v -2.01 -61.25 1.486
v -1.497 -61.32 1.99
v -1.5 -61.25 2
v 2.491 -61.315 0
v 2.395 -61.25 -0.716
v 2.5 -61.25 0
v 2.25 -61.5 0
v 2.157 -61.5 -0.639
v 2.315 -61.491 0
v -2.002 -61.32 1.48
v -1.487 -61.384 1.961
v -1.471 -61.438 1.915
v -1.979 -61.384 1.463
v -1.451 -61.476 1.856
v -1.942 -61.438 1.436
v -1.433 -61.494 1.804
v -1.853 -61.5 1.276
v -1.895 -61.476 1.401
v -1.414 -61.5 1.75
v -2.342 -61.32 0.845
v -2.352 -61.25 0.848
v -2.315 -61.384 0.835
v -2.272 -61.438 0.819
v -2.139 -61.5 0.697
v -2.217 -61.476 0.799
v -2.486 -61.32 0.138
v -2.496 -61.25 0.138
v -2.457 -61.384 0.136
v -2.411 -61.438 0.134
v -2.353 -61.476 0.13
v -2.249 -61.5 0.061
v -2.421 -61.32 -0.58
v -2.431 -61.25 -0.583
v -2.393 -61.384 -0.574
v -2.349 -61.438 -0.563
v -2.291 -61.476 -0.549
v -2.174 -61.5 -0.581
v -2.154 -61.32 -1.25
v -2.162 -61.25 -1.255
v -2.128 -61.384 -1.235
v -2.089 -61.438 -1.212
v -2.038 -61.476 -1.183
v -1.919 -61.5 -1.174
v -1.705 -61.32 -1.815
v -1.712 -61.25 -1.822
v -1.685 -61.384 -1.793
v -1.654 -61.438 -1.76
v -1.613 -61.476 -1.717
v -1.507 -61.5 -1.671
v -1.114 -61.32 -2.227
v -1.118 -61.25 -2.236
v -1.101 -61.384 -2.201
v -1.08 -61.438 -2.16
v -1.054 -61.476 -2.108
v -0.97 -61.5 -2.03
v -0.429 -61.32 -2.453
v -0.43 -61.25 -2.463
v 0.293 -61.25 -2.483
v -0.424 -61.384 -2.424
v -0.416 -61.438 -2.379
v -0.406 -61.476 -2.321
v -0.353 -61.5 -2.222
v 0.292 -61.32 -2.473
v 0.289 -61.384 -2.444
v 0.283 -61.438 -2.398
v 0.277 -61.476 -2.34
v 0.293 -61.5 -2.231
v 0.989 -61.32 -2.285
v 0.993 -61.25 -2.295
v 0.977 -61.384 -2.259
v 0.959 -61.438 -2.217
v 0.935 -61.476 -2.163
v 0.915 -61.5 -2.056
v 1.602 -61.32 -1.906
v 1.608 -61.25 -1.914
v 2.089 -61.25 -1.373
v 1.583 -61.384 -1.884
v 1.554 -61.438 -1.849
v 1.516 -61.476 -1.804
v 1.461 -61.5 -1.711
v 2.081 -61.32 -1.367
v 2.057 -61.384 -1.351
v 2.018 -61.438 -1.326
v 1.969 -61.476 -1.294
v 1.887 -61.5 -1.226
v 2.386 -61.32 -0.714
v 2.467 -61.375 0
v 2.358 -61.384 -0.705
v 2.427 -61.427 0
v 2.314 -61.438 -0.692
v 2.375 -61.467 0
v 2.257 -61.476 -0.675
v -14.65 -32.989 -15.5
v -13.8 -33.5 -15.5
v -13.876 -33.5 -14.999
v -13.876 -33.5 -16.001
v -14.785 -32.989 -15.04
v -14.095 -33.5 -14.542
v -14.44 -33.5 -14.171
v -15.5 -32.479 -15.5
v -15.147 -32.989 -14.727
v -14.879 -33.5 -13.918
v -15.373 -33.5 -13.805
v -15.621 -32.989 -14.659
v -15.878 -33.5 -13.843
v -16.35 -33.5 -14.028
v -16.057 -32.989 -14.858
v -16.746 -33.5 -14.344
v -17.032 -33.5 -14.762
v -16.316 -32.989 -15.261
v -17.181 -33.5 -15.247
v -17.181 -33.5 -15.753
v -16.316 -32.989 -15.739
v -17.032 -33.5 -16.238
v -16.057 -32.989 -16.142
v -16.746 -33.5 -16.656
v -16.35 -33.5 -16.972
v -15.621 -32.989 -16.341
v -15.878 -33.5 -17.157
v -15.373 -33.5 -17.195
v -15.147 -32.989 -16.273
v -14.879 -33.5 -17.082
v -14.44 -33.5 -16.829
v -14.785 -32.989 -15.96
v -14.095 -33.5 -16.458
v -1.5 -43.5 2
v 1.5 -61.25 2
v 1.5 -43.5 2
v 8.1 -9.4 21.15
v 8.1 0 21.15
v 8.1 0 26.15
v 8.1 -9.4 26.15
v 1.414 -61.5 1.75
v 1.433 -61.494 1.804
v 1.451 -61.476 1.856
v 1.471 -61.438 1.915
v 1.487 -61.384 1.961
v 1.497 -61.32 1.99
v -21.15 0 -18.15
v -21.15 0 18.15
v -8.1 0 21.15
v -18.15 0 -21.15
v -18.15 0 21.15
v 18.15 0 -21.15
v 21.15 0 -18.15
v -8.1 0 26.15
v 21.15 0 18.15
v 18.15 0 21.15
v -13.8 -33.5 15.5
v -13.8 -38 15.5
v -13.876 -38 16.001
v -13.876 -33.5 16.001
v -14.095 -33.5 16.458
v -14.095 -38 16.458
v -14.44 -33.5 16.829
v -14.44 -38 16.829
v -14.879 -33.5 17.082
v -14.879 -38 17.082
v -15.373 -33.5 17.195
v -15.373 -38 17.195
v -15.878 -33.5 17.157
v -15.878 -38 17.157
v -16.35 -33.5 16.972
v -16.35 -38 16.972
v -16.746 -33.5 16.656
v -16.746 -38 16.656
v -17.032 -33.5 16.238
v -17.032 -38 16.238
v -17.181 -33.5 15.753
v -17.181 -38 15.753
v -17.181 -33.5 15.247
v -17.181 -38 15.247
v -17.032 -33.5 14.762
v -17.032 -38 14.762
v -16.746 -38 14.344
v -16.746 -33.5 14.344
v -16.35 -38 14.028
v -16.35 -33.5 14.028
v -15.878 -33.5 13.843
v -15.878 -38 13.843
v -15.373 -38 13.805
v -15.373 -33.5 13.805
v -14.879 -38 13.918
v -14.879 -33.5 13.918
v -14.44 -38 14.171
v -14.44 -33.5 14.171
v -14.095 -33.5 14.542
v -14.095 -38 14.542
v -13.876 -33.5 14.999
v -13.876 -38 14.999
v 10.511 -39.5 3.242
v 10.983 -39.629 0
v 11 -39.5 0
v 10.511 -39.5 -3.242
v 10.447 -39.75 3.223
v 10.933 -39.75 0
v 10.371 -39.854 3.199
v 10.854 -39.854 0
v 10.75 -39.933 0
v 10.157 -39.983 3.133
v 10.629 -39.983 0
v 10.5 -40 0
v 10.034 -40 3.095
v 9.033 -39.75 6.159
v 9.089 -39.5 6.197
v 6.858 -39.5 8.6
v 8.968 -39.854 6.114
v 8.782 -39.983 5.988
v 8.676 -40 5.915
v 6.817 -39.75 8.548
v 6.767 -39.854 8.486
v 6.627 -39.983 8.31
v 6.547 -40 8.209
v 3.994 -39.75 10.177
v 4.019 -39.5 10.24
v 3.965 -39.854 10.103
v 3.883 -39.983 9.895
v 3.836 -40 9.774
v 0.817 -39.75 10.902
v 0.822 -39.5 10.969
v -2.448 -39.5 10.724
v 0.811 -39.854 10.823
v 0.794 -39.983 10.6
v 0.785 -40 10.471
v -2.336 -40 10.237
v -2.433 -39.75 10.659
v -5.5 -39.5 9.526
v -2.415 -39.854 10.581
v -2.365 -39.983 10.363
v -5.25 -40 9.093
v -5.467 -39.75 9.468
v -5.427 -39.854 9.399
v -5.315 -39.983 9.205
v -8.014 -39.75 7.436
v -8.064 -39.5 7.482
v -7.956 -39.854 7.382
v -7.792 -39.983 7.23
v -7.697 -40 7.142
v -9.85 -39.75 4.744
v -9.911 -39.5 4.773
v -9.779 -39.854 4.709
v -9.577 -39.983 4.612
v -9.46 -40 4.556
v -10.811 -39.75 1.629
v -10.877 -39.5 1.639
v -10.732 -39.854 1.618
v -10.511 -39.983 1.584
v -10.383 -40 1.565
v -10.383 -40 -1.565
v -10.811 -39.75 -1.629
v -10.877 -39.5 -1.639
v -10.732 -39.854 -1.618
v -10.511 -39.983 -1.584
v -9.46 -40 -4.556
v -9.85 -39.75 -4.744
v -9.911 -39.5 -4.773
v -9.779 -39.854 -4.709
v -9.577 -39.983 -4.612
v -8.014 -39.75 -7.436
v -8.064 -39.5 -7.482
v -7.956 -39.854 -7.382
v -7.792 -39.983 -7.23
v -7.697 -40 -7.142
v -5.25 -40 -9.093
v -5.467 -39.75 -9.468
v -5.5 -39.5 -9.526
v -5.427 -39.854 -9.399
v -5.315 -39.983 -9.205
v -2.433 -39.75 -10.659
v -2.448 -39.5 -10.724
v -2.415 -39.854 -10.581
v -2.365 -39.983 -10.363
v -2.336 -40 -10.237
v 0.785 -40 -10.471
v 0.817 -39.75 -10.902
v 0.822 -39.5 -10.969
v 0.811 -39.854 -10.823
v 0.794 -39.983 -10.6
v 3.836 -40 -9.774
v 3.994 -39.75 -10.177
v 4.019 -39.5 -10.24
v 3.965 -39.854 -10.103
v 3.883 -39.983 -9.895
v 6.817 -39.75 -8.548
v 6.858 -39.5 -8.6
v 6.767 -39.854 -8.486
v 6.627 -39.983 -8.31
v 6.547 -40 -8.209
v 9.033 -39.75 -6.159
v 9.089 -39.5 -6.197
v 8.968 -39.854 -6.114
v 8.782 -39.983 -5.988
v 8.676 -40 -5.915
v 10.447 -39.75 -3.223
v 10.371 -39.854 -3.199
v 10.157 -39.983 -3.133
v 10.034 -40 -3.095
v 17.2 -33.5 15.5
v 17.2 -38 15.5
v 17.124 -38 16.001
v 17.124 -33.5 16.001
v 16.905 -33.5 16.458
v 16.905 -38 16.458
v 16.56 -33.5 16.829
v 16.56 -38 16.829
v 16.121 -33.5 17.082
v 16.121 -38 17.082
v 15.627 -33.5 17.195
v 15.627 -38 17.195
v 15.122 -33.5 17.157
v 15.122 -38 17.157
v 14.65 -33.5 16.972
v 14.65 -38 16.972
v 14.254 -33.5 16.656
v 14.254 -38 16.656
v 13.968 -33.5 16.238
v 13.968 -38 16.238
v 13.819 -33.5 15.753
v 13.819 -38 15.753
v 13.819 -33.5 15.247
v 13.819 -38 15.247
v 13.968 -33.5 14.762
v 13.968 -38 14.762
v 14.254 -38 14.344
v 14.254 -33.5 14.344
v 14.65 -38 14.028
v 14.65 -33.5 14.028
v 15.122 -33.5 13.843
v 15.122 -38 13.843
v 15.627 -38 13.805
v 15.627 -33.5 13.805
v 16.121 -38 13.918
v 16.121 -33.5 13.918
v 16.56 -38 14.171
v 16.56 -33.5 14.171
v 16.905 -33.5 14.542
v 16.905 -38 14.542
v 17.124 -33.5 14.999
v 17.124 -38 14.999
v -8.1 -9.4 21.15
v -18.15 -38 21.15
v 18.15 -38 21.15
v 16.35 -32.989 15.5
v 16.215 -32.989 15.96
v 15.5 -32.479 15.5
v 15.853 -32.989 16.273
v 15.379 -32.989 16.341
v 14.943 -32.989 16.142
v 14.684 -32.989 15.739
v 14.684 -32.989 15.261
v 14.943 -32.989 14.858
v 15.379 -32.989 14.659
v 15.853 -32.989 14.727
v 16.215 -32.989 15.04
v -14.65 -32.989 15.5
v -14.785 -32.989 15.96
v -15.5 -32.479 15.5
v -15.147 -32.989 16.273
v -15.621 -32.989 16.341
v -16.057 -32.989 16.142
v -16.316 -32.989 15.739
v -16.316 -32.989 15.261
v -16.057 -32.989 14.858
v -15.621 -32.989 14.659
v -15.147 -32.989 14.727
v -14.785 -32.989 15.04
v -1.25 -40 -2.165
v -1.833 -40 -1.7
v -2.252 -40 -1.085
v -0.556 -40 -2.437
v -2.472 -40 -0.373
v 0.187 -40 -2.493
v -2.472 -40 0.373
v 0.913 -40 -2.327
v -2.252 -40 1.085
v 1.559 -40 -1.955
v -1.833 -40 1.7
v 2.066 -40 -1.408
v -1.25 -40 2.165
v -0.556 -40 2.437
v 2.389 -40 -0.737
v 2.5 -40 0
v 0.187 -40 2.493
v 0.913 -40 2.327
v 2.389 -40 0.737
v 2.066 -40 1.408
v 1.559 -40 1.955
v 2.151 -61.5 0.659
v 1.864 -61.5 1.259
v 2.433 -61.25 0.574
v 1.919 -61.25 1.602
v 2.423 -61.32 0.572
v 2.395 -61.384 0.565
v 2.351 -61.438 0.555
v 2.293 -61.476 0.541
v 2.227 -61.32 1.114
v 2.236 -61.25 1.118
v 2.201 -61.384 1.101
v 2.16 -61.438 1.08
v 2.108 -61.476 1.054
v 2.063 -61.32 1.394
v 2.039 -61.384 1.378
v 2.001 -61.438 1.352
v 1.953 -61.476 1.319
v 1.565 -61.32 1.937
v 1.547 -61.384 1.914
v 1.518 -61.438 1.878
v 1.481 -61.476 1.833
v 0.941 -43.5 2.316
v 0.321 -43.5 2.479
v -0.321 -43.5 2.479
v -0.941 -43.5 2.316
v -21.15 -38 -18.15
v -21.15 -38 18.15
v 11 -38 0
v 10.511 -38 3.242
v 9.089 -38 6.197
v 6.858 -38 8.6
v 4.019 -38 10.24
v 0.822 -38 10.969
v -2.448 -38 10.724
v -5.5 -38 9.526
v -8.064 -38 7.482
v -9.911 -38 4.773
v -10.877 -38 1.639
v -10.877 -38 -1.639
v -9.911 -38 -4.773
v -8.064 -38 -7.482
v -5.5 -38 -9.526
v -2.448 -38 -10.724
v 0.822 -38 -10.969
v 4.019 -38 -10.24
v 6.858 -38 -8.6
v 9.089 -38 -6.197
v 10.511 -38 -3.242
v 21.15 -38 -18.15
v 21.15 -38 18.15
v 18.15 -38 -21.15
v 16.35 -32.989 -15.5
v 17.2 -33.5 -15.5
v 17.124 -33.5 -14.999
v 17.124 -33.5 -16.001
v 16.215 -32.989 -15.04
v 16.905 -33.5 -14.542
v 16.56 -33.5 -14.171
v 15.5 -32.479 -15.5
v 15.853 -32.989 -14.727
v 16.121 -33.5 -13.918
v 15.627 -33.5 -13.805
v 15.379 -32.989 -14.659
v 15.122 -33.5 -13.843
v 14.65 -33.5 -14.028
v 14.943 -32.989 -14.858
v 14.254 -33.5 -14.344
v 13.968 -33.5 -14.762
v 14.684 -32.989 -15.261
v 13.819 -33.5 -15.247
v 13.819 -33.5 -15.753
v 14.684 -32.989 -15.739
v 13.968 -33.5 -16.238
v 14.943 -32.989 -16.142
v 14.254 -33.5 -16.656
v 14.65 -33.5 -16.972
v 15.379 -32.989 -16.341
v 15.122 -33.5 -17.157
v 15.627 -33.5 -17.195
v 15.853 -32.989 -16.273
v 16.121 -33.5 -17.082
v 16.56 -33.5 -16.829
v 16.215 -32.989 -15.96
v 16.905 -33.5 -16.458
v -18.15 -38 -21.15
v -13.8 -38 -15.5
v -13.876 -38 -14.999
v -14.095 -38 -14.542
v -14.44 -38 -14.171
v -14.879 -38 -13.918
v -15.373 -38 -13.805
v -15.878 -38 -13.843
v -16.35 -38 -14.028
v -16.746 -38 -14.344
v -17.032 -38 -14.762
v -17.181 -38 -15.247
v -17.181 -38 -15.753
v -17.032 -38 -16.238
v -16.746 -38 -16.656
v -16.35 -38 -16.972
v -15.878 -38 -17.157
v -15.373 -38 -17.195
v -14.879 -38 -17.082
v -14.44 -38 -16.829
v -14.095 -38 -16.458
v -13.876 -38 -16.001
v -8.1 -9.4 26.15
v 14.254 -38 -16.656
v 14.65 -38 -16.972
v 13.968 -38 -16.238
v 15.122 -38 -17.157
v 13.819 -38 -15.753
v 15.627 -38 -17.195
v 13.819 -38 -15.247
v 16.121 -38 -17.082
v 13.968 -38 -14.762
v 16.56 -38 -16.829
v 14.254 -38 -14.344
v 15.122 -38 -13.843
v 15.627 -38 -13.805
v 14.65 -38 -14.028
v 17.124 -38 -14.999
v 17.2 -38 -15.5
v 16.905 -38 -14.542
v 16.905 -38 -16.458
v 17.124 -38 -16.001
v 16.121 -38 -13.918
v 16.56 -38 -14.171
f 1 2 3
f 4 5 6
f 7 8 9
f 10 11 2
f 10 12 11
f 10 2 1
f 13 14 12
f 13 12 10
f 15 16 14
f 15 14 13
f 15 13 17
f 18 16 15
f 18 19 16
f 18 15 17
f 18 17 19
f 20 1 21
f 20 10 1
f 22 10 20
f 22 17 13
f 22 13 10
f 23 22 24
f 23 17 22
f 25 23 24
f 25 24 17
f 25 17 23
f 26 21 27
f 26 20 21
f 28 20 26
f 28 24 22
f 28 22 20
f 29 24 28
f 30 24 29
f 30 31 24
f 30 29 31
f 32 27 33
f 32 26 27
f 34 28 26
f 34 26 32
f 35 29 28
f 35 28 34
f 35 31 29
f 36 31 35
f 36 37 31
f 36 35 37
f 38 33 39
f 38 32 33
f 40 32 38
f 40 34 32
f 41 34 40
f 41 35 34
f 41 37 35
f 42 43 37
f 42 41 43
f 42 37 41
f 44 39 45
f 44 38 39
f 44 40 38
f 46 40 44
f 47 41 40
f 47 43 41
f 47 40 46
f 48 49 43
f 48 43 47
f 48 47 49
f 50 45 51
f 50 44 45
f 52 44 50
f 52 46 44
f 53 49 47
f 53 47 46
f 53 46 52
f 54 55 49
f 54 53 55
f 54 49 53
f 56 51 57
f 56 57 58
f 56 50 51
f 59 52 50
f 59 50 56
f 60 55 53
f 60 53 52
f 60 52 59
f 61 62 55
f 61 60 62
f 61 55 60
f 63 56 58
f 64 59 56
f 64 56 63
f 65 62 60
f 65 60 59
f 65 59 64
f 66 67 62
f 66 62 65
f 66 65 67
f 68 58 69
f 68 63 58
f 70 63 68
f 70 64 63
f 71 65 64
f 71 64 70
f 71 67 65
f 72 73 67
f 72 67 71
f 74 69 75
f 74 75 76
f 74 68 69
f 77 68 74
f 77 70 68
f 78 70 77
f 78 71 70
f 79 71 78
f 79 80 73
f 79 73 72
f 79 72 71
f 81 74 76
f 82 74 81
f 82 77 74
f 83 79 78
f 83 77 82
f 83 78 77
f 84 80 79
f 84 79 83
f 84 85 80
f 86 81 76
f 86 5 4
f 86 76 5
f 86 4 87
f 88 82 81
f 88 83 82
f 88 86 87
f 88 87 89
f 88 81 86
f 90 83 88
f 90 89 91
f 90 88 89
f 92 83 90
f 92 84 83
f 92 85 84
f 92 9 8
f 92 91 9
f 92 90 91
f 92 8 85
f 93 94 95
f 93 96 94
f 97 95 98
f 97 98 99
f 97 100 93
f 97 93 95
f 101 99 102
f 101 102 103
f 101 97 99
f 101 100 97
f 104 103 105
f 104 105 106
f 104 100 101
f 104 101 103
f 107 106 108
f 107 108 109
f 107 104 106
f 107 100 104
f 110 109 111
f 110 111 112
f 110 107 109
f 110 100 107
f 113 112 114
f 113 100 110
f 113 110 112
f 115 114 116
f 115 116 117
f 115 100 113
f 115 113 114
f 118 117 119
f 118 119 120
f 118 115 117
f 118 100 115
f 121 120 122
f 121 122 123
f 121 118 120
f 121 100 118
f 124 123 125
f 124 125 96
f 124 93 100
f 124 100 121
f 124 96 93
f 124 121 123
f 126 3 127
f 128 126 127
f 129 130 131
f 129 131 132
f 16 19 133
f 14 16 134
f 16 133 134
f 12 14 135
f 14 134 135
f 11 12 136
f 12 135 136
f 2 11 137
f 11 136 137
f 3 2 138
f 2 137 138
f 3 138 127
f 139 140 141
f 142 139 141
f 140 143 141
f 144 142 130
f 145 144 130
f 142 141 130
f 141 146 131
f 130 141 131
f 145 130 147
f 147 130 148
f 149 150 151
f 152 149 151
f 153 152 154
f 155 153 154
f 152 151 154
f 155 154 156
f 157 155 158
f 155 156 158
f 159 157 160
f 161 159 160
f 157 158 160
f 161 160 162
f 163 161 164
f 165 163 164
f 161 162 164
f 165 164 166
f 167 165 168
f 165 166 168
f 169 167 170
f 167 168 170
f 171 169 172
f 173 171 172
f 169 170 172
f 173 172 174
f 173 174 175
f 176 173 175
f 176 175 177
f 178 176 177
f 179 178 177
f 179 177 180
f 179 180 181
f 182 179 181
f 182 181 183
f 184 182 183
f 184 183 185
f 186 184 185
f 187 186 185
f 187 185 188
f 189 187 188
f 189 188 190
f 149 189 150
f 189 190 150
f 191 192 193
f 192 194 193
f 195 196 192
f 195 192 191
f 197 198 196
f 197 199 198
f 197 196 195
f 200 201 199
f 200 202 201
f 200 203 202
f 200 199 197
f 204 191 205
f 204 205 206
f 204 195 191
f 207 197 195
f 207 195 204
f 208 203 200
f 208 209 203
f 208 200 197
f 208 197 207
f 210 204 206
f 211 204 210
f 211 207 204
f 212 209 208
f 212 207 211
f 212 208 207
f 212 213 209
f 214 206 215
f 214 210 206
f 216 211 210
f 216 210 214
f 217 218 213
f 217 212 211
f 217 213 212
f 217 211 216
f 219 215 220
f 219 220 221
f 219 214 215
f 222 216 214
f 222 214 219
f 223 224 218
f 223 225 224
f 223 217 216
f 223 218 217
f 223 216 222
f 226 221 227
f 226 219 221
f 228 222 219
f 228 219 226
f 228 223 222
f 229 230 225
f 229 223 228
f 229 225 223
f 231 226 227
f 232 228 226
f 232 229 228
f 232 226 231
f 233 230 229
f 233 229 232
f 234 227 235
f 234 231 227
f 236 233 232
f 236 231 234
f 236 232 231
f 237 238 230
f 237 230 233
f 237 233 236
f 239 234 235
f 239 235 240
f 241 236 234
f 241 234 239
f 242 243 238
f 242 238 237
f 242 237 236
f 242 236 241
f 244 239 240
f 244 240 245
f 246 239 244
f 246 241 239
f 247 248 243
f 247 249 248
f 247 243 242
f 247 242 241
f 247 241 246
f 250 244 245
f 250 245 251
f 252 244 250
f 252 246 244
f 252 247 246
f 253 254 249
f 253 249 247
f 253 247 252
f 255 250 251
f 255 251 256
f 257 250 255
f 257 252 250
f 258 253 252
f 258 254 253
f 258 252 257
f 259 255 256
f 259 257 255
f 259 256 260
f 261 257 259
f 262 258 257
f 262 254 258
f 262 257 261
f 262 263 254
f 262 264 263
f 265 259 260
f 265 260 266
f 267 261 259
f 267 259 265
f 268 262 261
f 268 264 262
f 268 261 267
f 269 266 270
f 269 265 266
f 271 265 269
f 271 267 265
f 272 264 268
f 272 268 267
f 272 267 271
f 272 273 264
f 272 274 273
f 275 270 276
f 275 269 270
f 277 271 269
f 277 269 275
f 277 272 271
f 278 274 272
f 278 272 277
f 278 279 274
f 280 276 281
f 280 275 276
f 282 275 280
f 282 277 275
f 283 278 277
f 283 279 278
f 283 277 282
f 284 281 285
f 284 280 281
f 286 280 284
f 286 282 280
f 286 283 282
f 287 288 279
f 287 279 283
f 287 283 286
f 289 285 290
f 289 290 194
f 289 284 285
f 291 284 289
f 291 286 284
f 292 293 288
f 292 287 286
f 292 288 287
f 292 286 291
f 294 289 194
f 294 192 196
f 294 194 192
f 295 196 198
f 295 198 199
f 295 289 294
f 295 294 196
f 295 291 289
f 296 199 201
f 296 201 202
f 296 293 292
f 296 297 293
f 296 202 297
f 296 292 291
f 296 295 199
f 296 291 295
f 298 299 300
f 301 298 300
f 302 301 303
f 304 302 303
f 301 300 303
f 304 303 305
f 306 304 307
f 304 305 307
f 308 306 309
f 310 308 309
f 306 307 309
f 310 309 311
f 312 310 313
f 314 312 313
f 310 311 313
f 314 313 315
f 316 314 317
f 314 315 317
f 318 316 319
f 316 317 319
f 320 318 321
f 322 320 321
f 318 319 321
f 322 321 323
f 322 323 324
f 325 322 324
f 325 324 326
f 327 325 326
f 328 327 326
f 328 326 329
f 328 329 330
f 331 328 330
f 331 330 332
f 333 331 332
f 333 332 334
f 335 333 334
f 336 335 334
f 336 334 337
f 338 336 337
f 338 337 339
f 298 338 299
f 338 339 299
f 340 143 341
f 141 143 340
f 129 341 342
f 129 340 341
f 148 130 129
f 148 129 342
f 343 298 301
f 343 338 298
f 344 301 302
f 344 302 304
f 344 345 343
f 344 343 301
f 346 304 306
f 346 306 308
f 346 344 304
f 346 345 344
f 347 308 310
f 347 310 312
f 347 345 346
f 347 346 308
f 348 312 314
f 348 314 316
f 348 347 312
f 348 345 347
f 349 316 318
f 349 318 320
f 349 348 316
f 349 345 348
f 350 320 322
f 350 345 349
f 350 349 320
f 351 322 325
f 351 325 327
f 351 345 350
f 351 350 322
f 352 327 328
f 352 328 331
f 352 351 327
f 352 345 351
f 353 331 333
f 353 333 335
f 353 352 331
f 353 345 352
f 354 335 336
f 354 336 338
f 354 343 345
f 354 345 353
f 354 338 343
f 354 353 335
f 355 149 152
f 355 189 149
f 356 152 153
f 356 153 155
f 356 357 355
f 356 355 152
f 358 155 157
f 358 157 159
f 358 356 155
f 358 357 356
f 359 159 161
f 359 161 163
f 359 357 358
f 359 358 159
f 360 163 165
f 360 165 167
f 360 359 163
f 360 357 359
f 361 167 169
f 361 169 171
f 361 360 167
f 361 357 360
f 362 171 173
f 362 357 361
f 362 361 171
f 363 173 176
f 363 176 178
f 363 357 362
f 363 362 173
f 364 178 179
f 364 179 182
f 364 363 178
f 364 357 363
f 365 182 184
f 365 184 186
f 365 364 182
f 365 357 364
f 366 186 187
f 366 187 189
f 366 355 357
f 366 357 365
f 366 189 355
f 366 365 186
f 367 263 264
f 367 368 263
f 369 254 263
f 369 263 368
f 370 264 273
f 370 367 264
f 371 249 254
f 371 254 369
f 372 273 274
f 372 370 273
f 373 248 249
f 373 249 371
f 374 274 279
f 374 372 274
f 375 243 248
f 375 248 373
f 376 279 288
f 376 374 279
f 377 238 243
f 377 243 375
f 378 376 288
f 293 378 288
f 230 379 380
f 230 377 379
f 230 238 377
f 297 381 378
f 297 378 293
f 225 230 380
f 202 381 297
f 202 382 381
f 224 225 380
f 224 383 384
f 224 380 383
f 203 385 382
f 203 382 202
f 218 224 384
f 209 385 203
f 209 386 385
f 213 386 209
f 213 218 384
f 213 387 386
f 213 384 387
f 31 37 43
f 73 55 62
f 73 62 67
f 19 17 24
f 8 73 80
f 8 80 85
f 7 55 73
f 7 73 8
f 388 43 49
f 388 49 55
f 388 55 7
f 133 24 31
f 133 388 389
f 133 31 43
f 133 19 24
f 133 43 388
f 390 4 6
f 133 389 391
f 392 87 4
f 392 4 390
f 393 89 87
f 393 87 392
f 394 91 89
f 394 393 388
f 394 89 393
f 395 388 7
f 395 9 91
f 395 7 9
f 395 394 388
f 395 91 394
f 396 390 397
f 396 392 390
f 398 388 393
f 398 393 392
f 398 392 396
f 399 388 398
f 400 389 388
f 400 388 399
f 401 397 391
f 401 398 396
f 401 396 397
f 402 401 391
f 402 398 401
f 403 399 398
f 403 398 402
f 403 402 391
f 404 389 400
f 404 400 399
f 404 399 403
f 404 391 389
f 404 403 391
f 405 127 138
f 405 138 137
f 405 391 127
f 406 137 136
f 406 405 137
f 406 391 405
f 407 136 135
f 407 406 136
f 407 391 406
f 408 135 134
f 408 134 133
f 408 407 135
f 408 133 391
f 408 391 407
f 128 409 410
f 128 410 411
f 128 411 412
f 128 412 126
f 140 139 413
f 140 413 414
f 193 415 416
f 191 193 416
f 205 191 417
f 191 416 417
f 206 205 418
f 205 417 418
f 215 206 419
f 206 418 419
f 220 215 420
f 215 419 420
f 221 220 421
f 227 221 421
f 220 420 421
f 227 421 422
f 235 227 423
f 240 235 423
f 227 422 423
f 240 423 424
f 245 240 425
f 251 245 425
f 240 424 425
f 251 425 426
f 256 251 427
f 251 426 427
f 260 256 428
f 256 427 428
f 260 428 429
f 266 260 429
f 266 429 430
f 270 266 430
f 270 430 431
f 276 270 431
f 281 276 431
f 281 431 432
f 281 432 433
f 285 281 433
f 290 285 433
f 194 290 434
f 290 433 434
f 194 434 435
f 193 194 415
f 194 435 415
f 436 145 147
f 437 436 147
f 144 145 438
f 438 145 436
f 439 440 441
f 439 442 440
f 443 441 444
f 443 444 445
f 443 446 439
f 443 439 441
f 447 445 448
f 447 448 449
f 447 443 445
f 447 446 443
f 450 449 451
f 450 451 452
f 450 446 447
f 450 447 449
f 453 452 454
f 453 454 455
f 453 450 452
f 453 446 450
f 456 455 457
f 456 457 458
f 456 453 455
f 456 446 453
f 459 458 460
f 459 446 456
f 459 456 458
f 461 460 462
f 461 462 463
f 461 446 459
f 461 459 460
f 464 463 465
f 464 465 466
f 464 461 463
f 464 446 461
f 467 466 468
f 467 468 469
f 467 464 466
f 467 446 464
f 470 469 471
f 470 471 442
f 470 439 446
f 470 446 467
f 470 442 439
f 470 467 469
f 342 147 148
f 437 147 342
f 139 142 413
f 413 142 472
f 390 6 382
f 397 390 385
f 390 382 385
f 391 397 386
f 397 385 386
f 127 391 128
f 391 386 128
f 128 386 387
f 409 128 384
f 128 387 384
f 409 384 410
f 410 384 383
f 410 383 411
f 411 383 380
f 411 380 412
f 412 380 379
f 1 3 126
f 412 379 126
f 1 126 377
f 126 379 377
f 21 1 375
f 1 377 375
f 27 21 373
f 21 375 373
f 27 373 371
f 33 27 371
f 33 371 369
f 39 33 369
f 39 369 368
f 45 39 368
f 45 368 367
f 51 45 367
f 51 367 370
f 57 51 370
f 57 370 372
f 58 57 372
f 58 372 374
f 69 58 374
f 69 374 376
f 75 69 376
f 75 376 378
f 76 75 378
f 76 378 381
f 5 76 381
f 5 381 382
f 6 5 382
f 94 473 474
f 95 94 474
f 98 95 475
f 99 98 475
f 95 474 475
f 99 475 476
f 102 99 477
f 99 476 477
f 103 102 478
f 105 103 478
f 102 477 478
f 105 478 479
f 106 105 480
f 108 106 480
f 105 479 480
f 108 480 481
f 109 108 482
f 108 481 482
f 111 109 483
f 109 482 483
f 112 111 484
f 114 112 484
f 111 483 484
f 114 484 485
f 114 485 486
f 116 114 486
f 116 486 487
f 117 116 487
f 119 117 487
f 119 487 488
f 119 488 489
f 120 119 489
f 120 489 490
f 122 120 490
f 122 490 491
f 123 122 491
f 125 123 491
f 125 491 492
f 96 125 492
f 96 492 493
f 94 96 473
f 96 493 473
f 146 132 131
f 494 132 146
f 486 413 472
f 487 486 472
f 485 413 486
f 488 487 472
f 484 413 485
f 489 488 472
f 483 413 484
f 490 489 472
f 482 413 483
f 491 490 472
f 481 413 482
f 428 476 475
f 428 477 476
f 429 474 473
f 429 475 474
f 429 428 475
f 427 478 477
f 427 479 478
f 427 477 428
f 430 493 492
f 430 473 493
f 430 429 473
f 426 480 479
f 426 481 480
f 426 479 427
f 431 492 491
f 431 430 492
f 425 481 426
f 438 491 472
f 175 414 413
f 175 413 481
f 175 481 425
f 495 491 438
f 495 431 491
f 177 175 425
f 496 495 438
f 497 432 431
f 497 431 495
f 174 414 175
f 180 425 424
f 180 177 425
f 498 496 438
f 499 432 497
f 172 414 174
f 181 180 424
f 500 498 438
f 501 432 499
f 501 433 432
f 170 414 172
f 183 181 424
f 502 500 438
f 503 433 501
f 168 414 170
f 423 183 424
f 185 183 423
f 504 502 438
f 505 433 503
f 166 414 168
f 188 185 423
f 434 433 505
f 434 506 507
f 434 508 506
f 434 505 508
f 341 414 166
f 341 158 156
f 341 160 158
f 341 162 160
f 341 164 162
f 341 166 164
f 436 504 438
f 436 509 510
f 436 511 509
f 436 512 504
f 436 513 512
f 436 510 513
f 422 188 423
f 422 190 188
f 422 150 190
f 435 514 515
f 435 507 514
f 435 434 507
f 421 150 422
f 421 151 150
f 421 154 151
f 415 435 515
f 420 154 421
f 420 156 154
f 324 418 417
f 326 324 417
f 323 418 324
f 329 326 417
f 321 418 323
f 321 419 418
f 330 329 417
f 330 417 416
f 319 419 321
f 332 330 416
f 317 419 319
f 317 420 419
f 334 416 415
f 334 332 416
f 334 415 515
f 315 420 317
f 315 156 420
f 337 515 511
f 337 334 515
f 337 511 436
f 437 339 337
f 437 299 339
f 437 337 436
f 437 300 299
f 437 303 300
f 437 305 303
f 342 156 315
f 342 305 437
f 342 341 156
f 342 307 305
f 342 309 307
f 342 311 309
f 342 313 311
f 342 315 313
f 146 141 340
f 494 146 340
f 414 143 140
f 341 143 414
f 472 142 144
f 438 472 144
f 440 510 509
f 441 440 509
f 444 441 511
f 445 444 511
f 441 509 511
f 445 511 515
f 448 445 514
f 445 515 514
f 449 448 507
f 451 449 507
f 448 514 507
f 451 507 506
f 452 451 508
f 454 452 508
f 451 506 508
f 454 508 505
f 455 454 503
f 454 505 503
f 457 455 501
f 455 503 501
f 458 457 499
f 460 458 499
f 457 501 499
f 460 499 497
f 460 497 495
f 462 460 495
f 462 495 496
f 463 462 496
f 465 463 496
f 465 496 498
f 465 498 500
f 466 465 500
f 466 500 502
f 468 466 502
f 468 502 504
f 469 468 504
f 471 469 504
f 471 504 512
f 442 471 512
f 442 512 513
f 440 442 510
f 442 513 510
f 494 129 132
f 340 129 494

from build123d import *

# Parameters (mm, degrees)
SKETCH_W     = 42.3
SKETCH_H     = 42.3
PAD_DEPTH    = 38
SKETCH001_R  = 1.7
HOLE_DEPTH   = 4.5
HOLE_TIPS_R  = 1.7
SKETCH002_R  = 11
PAD001_DEPTH = 2
FILLET_R     = 0.5
CHAMFER_SIZE = 3
SKETCH003_R  = 2.5
PAD002_DEPTH = 21.5
POCKET_DEPTH = 18
FILLET001_R  = 0.25
SKETCH005_W  = 16.2
SKETCH005_H  = 9.4
PAD003_DEPTH = 5


with BuildPart() as part:
    # Sketch → Pad (new body)
    with BuildSketch(Plane.XZ):
        Rectangle(SKETCH_W, SKETCH_H)
    extrude(amount=PAD_DEPTH)

    # Sketch001 (on Face6 of Pad) → Hole (cut)
    with BuildSketch(Plane.XZ.offset(38)):
        with Locations((-15.5, 15.5)):
            Circle(SKETCH001_R)
        with Locations((15.5, 15.5)):
            Circle(SKETCH001_R)
        with Locations((15.5, -15.5)):
            Circle(SKETCH001_R)
        with Locations((-15.5, -15.5)):
            Circle(SKETCH001_R)
    extrude(amount=-HOLE_DEPTH, mode=Mode.SUBTRACT)

    # Hole tips → Hole tip 1 section 0
    with BuildSketch(Plane.XZ.offset(33.5), mode=Mode.PRIVATE) as hole_tip_1_s0:
        with Locations((-15.5, 15.5)):
            Circle(HOLE_TIPS_R)
    loft([hole_tip_1_s0.sketch, Vertex(-15.5, -32.478537, 15.5)], mode=Mode.SUBTRACT)

    # Hole tips → Hole tip 2 section 0
    with BuildSketch(Plane.XZ.offset(33.5), mode=Mode.PRIVATE) as hole_tip_2_s0:
        with Locations((15.5, 15.5)):
            Circle(HOLE_TIPS_R)
    loft([hole_tip_2_s0.sketch, Vertex(15.5, -32.478537, 15.5)], mode=Mode.SUBTRACT)

    # Hole tips → Hole tip 3 section 0
    with BuildSketch(Plane.XZ.offset(33.5), mode=Mode.PRIVATE) as hole_tip_3_s0:
        with Locations((15.5, -15.5)):
            Circle(HOLE_TIPS_R)
    loft([hole_tip_3_s0.sketch, Vertex(15.5, -32.478537, -15.5)], mode=Mode.SUBTRACT)

    # Hole tips → Hole tip 4 section 0
    with BuildSketch(Plane.XZ.offset(33.5), mode=Mode.PRIVATE) as hole_tip_4_s0:
        with Locations((-15.5, -15.5)):
            Circle(HOLE_TIPS_R)
    loft([hole_tip_4_s0.sketch, Vertex(-15.5, -32.478537, -15.5)], mode=Mode.SUBTRACT)

    # Sketch002 (on Face5 of Hole) → Pad001 (join)
    with BuildSketch(Plane.XZ.offset(38)):
        Circle(SKETCH002_R)
    extrude(amount=PAD001_DEPTH)

    # Fillet
    fillet_edges = [part.edges().sort_by_distance(p)[0] for p in [
        (-11, -40, 0),
    ]]
    fillet(fillet_edges, radius=FILLET_R)

    # Chamfer
    chamfer_edges = [part.edges().sort_by_distance(p)[0] for p in [
        (-21.15, -19, -21.15),
        (-21.15, -19, 21.15),
        (21.15, -19, 21.15),
        (21.15, -19, -21.15),
    ]]
    chamfer(chamfer_edges, length=CHAMFER_SIZE)

    # Sketch003 (on Face21 of Chamfer) → Pad002 (join)
    with BuildSketch(Plane.XZ.offset(40)):
        Circle(SKETCH003_R)
    extrude(amount=PAD002_DEPTH)

    # Sketch004 (on Face23 of Pad002) → Pocket (cut)
    with BuildSketch(Plane.XZ.offset(61.5)):
        with BuildLine():
            Line((-1.5, 2), (1.5, 2))
            ThreePointArc((1.5, 2), (0, 2.5), (-1.5, 2))
        make_face()
    extrude(amount=-POCKET_DEPTH, mode=Mode.SUBTRACT)

    # Fillet001
    fillet001_edges = [part.edges().sort_by_distance(p)[0] for p in [
        (-1.118034, -61.5, -2.236068),
        (0, -61.5, 2),
        (2.236068, -61.5, 1.118034),
    ]]
    fillet(fillet001_edges, radius=FILLET001_R)

    # Sketch005 (on Face19 of Fillet001) → Pad003 (join)
    with BuildSketch(Plane(origin=(0, 0, 21.15), x_dir=(-1, 0, 0), z_dir=(0, 0, 1))):
        with Locations((0, 4.7)):
            Rectangle(SKETCH005_W, SKETCH005_H)
    extrude(amount=PAD003_DEPTH)


solid = part.part
